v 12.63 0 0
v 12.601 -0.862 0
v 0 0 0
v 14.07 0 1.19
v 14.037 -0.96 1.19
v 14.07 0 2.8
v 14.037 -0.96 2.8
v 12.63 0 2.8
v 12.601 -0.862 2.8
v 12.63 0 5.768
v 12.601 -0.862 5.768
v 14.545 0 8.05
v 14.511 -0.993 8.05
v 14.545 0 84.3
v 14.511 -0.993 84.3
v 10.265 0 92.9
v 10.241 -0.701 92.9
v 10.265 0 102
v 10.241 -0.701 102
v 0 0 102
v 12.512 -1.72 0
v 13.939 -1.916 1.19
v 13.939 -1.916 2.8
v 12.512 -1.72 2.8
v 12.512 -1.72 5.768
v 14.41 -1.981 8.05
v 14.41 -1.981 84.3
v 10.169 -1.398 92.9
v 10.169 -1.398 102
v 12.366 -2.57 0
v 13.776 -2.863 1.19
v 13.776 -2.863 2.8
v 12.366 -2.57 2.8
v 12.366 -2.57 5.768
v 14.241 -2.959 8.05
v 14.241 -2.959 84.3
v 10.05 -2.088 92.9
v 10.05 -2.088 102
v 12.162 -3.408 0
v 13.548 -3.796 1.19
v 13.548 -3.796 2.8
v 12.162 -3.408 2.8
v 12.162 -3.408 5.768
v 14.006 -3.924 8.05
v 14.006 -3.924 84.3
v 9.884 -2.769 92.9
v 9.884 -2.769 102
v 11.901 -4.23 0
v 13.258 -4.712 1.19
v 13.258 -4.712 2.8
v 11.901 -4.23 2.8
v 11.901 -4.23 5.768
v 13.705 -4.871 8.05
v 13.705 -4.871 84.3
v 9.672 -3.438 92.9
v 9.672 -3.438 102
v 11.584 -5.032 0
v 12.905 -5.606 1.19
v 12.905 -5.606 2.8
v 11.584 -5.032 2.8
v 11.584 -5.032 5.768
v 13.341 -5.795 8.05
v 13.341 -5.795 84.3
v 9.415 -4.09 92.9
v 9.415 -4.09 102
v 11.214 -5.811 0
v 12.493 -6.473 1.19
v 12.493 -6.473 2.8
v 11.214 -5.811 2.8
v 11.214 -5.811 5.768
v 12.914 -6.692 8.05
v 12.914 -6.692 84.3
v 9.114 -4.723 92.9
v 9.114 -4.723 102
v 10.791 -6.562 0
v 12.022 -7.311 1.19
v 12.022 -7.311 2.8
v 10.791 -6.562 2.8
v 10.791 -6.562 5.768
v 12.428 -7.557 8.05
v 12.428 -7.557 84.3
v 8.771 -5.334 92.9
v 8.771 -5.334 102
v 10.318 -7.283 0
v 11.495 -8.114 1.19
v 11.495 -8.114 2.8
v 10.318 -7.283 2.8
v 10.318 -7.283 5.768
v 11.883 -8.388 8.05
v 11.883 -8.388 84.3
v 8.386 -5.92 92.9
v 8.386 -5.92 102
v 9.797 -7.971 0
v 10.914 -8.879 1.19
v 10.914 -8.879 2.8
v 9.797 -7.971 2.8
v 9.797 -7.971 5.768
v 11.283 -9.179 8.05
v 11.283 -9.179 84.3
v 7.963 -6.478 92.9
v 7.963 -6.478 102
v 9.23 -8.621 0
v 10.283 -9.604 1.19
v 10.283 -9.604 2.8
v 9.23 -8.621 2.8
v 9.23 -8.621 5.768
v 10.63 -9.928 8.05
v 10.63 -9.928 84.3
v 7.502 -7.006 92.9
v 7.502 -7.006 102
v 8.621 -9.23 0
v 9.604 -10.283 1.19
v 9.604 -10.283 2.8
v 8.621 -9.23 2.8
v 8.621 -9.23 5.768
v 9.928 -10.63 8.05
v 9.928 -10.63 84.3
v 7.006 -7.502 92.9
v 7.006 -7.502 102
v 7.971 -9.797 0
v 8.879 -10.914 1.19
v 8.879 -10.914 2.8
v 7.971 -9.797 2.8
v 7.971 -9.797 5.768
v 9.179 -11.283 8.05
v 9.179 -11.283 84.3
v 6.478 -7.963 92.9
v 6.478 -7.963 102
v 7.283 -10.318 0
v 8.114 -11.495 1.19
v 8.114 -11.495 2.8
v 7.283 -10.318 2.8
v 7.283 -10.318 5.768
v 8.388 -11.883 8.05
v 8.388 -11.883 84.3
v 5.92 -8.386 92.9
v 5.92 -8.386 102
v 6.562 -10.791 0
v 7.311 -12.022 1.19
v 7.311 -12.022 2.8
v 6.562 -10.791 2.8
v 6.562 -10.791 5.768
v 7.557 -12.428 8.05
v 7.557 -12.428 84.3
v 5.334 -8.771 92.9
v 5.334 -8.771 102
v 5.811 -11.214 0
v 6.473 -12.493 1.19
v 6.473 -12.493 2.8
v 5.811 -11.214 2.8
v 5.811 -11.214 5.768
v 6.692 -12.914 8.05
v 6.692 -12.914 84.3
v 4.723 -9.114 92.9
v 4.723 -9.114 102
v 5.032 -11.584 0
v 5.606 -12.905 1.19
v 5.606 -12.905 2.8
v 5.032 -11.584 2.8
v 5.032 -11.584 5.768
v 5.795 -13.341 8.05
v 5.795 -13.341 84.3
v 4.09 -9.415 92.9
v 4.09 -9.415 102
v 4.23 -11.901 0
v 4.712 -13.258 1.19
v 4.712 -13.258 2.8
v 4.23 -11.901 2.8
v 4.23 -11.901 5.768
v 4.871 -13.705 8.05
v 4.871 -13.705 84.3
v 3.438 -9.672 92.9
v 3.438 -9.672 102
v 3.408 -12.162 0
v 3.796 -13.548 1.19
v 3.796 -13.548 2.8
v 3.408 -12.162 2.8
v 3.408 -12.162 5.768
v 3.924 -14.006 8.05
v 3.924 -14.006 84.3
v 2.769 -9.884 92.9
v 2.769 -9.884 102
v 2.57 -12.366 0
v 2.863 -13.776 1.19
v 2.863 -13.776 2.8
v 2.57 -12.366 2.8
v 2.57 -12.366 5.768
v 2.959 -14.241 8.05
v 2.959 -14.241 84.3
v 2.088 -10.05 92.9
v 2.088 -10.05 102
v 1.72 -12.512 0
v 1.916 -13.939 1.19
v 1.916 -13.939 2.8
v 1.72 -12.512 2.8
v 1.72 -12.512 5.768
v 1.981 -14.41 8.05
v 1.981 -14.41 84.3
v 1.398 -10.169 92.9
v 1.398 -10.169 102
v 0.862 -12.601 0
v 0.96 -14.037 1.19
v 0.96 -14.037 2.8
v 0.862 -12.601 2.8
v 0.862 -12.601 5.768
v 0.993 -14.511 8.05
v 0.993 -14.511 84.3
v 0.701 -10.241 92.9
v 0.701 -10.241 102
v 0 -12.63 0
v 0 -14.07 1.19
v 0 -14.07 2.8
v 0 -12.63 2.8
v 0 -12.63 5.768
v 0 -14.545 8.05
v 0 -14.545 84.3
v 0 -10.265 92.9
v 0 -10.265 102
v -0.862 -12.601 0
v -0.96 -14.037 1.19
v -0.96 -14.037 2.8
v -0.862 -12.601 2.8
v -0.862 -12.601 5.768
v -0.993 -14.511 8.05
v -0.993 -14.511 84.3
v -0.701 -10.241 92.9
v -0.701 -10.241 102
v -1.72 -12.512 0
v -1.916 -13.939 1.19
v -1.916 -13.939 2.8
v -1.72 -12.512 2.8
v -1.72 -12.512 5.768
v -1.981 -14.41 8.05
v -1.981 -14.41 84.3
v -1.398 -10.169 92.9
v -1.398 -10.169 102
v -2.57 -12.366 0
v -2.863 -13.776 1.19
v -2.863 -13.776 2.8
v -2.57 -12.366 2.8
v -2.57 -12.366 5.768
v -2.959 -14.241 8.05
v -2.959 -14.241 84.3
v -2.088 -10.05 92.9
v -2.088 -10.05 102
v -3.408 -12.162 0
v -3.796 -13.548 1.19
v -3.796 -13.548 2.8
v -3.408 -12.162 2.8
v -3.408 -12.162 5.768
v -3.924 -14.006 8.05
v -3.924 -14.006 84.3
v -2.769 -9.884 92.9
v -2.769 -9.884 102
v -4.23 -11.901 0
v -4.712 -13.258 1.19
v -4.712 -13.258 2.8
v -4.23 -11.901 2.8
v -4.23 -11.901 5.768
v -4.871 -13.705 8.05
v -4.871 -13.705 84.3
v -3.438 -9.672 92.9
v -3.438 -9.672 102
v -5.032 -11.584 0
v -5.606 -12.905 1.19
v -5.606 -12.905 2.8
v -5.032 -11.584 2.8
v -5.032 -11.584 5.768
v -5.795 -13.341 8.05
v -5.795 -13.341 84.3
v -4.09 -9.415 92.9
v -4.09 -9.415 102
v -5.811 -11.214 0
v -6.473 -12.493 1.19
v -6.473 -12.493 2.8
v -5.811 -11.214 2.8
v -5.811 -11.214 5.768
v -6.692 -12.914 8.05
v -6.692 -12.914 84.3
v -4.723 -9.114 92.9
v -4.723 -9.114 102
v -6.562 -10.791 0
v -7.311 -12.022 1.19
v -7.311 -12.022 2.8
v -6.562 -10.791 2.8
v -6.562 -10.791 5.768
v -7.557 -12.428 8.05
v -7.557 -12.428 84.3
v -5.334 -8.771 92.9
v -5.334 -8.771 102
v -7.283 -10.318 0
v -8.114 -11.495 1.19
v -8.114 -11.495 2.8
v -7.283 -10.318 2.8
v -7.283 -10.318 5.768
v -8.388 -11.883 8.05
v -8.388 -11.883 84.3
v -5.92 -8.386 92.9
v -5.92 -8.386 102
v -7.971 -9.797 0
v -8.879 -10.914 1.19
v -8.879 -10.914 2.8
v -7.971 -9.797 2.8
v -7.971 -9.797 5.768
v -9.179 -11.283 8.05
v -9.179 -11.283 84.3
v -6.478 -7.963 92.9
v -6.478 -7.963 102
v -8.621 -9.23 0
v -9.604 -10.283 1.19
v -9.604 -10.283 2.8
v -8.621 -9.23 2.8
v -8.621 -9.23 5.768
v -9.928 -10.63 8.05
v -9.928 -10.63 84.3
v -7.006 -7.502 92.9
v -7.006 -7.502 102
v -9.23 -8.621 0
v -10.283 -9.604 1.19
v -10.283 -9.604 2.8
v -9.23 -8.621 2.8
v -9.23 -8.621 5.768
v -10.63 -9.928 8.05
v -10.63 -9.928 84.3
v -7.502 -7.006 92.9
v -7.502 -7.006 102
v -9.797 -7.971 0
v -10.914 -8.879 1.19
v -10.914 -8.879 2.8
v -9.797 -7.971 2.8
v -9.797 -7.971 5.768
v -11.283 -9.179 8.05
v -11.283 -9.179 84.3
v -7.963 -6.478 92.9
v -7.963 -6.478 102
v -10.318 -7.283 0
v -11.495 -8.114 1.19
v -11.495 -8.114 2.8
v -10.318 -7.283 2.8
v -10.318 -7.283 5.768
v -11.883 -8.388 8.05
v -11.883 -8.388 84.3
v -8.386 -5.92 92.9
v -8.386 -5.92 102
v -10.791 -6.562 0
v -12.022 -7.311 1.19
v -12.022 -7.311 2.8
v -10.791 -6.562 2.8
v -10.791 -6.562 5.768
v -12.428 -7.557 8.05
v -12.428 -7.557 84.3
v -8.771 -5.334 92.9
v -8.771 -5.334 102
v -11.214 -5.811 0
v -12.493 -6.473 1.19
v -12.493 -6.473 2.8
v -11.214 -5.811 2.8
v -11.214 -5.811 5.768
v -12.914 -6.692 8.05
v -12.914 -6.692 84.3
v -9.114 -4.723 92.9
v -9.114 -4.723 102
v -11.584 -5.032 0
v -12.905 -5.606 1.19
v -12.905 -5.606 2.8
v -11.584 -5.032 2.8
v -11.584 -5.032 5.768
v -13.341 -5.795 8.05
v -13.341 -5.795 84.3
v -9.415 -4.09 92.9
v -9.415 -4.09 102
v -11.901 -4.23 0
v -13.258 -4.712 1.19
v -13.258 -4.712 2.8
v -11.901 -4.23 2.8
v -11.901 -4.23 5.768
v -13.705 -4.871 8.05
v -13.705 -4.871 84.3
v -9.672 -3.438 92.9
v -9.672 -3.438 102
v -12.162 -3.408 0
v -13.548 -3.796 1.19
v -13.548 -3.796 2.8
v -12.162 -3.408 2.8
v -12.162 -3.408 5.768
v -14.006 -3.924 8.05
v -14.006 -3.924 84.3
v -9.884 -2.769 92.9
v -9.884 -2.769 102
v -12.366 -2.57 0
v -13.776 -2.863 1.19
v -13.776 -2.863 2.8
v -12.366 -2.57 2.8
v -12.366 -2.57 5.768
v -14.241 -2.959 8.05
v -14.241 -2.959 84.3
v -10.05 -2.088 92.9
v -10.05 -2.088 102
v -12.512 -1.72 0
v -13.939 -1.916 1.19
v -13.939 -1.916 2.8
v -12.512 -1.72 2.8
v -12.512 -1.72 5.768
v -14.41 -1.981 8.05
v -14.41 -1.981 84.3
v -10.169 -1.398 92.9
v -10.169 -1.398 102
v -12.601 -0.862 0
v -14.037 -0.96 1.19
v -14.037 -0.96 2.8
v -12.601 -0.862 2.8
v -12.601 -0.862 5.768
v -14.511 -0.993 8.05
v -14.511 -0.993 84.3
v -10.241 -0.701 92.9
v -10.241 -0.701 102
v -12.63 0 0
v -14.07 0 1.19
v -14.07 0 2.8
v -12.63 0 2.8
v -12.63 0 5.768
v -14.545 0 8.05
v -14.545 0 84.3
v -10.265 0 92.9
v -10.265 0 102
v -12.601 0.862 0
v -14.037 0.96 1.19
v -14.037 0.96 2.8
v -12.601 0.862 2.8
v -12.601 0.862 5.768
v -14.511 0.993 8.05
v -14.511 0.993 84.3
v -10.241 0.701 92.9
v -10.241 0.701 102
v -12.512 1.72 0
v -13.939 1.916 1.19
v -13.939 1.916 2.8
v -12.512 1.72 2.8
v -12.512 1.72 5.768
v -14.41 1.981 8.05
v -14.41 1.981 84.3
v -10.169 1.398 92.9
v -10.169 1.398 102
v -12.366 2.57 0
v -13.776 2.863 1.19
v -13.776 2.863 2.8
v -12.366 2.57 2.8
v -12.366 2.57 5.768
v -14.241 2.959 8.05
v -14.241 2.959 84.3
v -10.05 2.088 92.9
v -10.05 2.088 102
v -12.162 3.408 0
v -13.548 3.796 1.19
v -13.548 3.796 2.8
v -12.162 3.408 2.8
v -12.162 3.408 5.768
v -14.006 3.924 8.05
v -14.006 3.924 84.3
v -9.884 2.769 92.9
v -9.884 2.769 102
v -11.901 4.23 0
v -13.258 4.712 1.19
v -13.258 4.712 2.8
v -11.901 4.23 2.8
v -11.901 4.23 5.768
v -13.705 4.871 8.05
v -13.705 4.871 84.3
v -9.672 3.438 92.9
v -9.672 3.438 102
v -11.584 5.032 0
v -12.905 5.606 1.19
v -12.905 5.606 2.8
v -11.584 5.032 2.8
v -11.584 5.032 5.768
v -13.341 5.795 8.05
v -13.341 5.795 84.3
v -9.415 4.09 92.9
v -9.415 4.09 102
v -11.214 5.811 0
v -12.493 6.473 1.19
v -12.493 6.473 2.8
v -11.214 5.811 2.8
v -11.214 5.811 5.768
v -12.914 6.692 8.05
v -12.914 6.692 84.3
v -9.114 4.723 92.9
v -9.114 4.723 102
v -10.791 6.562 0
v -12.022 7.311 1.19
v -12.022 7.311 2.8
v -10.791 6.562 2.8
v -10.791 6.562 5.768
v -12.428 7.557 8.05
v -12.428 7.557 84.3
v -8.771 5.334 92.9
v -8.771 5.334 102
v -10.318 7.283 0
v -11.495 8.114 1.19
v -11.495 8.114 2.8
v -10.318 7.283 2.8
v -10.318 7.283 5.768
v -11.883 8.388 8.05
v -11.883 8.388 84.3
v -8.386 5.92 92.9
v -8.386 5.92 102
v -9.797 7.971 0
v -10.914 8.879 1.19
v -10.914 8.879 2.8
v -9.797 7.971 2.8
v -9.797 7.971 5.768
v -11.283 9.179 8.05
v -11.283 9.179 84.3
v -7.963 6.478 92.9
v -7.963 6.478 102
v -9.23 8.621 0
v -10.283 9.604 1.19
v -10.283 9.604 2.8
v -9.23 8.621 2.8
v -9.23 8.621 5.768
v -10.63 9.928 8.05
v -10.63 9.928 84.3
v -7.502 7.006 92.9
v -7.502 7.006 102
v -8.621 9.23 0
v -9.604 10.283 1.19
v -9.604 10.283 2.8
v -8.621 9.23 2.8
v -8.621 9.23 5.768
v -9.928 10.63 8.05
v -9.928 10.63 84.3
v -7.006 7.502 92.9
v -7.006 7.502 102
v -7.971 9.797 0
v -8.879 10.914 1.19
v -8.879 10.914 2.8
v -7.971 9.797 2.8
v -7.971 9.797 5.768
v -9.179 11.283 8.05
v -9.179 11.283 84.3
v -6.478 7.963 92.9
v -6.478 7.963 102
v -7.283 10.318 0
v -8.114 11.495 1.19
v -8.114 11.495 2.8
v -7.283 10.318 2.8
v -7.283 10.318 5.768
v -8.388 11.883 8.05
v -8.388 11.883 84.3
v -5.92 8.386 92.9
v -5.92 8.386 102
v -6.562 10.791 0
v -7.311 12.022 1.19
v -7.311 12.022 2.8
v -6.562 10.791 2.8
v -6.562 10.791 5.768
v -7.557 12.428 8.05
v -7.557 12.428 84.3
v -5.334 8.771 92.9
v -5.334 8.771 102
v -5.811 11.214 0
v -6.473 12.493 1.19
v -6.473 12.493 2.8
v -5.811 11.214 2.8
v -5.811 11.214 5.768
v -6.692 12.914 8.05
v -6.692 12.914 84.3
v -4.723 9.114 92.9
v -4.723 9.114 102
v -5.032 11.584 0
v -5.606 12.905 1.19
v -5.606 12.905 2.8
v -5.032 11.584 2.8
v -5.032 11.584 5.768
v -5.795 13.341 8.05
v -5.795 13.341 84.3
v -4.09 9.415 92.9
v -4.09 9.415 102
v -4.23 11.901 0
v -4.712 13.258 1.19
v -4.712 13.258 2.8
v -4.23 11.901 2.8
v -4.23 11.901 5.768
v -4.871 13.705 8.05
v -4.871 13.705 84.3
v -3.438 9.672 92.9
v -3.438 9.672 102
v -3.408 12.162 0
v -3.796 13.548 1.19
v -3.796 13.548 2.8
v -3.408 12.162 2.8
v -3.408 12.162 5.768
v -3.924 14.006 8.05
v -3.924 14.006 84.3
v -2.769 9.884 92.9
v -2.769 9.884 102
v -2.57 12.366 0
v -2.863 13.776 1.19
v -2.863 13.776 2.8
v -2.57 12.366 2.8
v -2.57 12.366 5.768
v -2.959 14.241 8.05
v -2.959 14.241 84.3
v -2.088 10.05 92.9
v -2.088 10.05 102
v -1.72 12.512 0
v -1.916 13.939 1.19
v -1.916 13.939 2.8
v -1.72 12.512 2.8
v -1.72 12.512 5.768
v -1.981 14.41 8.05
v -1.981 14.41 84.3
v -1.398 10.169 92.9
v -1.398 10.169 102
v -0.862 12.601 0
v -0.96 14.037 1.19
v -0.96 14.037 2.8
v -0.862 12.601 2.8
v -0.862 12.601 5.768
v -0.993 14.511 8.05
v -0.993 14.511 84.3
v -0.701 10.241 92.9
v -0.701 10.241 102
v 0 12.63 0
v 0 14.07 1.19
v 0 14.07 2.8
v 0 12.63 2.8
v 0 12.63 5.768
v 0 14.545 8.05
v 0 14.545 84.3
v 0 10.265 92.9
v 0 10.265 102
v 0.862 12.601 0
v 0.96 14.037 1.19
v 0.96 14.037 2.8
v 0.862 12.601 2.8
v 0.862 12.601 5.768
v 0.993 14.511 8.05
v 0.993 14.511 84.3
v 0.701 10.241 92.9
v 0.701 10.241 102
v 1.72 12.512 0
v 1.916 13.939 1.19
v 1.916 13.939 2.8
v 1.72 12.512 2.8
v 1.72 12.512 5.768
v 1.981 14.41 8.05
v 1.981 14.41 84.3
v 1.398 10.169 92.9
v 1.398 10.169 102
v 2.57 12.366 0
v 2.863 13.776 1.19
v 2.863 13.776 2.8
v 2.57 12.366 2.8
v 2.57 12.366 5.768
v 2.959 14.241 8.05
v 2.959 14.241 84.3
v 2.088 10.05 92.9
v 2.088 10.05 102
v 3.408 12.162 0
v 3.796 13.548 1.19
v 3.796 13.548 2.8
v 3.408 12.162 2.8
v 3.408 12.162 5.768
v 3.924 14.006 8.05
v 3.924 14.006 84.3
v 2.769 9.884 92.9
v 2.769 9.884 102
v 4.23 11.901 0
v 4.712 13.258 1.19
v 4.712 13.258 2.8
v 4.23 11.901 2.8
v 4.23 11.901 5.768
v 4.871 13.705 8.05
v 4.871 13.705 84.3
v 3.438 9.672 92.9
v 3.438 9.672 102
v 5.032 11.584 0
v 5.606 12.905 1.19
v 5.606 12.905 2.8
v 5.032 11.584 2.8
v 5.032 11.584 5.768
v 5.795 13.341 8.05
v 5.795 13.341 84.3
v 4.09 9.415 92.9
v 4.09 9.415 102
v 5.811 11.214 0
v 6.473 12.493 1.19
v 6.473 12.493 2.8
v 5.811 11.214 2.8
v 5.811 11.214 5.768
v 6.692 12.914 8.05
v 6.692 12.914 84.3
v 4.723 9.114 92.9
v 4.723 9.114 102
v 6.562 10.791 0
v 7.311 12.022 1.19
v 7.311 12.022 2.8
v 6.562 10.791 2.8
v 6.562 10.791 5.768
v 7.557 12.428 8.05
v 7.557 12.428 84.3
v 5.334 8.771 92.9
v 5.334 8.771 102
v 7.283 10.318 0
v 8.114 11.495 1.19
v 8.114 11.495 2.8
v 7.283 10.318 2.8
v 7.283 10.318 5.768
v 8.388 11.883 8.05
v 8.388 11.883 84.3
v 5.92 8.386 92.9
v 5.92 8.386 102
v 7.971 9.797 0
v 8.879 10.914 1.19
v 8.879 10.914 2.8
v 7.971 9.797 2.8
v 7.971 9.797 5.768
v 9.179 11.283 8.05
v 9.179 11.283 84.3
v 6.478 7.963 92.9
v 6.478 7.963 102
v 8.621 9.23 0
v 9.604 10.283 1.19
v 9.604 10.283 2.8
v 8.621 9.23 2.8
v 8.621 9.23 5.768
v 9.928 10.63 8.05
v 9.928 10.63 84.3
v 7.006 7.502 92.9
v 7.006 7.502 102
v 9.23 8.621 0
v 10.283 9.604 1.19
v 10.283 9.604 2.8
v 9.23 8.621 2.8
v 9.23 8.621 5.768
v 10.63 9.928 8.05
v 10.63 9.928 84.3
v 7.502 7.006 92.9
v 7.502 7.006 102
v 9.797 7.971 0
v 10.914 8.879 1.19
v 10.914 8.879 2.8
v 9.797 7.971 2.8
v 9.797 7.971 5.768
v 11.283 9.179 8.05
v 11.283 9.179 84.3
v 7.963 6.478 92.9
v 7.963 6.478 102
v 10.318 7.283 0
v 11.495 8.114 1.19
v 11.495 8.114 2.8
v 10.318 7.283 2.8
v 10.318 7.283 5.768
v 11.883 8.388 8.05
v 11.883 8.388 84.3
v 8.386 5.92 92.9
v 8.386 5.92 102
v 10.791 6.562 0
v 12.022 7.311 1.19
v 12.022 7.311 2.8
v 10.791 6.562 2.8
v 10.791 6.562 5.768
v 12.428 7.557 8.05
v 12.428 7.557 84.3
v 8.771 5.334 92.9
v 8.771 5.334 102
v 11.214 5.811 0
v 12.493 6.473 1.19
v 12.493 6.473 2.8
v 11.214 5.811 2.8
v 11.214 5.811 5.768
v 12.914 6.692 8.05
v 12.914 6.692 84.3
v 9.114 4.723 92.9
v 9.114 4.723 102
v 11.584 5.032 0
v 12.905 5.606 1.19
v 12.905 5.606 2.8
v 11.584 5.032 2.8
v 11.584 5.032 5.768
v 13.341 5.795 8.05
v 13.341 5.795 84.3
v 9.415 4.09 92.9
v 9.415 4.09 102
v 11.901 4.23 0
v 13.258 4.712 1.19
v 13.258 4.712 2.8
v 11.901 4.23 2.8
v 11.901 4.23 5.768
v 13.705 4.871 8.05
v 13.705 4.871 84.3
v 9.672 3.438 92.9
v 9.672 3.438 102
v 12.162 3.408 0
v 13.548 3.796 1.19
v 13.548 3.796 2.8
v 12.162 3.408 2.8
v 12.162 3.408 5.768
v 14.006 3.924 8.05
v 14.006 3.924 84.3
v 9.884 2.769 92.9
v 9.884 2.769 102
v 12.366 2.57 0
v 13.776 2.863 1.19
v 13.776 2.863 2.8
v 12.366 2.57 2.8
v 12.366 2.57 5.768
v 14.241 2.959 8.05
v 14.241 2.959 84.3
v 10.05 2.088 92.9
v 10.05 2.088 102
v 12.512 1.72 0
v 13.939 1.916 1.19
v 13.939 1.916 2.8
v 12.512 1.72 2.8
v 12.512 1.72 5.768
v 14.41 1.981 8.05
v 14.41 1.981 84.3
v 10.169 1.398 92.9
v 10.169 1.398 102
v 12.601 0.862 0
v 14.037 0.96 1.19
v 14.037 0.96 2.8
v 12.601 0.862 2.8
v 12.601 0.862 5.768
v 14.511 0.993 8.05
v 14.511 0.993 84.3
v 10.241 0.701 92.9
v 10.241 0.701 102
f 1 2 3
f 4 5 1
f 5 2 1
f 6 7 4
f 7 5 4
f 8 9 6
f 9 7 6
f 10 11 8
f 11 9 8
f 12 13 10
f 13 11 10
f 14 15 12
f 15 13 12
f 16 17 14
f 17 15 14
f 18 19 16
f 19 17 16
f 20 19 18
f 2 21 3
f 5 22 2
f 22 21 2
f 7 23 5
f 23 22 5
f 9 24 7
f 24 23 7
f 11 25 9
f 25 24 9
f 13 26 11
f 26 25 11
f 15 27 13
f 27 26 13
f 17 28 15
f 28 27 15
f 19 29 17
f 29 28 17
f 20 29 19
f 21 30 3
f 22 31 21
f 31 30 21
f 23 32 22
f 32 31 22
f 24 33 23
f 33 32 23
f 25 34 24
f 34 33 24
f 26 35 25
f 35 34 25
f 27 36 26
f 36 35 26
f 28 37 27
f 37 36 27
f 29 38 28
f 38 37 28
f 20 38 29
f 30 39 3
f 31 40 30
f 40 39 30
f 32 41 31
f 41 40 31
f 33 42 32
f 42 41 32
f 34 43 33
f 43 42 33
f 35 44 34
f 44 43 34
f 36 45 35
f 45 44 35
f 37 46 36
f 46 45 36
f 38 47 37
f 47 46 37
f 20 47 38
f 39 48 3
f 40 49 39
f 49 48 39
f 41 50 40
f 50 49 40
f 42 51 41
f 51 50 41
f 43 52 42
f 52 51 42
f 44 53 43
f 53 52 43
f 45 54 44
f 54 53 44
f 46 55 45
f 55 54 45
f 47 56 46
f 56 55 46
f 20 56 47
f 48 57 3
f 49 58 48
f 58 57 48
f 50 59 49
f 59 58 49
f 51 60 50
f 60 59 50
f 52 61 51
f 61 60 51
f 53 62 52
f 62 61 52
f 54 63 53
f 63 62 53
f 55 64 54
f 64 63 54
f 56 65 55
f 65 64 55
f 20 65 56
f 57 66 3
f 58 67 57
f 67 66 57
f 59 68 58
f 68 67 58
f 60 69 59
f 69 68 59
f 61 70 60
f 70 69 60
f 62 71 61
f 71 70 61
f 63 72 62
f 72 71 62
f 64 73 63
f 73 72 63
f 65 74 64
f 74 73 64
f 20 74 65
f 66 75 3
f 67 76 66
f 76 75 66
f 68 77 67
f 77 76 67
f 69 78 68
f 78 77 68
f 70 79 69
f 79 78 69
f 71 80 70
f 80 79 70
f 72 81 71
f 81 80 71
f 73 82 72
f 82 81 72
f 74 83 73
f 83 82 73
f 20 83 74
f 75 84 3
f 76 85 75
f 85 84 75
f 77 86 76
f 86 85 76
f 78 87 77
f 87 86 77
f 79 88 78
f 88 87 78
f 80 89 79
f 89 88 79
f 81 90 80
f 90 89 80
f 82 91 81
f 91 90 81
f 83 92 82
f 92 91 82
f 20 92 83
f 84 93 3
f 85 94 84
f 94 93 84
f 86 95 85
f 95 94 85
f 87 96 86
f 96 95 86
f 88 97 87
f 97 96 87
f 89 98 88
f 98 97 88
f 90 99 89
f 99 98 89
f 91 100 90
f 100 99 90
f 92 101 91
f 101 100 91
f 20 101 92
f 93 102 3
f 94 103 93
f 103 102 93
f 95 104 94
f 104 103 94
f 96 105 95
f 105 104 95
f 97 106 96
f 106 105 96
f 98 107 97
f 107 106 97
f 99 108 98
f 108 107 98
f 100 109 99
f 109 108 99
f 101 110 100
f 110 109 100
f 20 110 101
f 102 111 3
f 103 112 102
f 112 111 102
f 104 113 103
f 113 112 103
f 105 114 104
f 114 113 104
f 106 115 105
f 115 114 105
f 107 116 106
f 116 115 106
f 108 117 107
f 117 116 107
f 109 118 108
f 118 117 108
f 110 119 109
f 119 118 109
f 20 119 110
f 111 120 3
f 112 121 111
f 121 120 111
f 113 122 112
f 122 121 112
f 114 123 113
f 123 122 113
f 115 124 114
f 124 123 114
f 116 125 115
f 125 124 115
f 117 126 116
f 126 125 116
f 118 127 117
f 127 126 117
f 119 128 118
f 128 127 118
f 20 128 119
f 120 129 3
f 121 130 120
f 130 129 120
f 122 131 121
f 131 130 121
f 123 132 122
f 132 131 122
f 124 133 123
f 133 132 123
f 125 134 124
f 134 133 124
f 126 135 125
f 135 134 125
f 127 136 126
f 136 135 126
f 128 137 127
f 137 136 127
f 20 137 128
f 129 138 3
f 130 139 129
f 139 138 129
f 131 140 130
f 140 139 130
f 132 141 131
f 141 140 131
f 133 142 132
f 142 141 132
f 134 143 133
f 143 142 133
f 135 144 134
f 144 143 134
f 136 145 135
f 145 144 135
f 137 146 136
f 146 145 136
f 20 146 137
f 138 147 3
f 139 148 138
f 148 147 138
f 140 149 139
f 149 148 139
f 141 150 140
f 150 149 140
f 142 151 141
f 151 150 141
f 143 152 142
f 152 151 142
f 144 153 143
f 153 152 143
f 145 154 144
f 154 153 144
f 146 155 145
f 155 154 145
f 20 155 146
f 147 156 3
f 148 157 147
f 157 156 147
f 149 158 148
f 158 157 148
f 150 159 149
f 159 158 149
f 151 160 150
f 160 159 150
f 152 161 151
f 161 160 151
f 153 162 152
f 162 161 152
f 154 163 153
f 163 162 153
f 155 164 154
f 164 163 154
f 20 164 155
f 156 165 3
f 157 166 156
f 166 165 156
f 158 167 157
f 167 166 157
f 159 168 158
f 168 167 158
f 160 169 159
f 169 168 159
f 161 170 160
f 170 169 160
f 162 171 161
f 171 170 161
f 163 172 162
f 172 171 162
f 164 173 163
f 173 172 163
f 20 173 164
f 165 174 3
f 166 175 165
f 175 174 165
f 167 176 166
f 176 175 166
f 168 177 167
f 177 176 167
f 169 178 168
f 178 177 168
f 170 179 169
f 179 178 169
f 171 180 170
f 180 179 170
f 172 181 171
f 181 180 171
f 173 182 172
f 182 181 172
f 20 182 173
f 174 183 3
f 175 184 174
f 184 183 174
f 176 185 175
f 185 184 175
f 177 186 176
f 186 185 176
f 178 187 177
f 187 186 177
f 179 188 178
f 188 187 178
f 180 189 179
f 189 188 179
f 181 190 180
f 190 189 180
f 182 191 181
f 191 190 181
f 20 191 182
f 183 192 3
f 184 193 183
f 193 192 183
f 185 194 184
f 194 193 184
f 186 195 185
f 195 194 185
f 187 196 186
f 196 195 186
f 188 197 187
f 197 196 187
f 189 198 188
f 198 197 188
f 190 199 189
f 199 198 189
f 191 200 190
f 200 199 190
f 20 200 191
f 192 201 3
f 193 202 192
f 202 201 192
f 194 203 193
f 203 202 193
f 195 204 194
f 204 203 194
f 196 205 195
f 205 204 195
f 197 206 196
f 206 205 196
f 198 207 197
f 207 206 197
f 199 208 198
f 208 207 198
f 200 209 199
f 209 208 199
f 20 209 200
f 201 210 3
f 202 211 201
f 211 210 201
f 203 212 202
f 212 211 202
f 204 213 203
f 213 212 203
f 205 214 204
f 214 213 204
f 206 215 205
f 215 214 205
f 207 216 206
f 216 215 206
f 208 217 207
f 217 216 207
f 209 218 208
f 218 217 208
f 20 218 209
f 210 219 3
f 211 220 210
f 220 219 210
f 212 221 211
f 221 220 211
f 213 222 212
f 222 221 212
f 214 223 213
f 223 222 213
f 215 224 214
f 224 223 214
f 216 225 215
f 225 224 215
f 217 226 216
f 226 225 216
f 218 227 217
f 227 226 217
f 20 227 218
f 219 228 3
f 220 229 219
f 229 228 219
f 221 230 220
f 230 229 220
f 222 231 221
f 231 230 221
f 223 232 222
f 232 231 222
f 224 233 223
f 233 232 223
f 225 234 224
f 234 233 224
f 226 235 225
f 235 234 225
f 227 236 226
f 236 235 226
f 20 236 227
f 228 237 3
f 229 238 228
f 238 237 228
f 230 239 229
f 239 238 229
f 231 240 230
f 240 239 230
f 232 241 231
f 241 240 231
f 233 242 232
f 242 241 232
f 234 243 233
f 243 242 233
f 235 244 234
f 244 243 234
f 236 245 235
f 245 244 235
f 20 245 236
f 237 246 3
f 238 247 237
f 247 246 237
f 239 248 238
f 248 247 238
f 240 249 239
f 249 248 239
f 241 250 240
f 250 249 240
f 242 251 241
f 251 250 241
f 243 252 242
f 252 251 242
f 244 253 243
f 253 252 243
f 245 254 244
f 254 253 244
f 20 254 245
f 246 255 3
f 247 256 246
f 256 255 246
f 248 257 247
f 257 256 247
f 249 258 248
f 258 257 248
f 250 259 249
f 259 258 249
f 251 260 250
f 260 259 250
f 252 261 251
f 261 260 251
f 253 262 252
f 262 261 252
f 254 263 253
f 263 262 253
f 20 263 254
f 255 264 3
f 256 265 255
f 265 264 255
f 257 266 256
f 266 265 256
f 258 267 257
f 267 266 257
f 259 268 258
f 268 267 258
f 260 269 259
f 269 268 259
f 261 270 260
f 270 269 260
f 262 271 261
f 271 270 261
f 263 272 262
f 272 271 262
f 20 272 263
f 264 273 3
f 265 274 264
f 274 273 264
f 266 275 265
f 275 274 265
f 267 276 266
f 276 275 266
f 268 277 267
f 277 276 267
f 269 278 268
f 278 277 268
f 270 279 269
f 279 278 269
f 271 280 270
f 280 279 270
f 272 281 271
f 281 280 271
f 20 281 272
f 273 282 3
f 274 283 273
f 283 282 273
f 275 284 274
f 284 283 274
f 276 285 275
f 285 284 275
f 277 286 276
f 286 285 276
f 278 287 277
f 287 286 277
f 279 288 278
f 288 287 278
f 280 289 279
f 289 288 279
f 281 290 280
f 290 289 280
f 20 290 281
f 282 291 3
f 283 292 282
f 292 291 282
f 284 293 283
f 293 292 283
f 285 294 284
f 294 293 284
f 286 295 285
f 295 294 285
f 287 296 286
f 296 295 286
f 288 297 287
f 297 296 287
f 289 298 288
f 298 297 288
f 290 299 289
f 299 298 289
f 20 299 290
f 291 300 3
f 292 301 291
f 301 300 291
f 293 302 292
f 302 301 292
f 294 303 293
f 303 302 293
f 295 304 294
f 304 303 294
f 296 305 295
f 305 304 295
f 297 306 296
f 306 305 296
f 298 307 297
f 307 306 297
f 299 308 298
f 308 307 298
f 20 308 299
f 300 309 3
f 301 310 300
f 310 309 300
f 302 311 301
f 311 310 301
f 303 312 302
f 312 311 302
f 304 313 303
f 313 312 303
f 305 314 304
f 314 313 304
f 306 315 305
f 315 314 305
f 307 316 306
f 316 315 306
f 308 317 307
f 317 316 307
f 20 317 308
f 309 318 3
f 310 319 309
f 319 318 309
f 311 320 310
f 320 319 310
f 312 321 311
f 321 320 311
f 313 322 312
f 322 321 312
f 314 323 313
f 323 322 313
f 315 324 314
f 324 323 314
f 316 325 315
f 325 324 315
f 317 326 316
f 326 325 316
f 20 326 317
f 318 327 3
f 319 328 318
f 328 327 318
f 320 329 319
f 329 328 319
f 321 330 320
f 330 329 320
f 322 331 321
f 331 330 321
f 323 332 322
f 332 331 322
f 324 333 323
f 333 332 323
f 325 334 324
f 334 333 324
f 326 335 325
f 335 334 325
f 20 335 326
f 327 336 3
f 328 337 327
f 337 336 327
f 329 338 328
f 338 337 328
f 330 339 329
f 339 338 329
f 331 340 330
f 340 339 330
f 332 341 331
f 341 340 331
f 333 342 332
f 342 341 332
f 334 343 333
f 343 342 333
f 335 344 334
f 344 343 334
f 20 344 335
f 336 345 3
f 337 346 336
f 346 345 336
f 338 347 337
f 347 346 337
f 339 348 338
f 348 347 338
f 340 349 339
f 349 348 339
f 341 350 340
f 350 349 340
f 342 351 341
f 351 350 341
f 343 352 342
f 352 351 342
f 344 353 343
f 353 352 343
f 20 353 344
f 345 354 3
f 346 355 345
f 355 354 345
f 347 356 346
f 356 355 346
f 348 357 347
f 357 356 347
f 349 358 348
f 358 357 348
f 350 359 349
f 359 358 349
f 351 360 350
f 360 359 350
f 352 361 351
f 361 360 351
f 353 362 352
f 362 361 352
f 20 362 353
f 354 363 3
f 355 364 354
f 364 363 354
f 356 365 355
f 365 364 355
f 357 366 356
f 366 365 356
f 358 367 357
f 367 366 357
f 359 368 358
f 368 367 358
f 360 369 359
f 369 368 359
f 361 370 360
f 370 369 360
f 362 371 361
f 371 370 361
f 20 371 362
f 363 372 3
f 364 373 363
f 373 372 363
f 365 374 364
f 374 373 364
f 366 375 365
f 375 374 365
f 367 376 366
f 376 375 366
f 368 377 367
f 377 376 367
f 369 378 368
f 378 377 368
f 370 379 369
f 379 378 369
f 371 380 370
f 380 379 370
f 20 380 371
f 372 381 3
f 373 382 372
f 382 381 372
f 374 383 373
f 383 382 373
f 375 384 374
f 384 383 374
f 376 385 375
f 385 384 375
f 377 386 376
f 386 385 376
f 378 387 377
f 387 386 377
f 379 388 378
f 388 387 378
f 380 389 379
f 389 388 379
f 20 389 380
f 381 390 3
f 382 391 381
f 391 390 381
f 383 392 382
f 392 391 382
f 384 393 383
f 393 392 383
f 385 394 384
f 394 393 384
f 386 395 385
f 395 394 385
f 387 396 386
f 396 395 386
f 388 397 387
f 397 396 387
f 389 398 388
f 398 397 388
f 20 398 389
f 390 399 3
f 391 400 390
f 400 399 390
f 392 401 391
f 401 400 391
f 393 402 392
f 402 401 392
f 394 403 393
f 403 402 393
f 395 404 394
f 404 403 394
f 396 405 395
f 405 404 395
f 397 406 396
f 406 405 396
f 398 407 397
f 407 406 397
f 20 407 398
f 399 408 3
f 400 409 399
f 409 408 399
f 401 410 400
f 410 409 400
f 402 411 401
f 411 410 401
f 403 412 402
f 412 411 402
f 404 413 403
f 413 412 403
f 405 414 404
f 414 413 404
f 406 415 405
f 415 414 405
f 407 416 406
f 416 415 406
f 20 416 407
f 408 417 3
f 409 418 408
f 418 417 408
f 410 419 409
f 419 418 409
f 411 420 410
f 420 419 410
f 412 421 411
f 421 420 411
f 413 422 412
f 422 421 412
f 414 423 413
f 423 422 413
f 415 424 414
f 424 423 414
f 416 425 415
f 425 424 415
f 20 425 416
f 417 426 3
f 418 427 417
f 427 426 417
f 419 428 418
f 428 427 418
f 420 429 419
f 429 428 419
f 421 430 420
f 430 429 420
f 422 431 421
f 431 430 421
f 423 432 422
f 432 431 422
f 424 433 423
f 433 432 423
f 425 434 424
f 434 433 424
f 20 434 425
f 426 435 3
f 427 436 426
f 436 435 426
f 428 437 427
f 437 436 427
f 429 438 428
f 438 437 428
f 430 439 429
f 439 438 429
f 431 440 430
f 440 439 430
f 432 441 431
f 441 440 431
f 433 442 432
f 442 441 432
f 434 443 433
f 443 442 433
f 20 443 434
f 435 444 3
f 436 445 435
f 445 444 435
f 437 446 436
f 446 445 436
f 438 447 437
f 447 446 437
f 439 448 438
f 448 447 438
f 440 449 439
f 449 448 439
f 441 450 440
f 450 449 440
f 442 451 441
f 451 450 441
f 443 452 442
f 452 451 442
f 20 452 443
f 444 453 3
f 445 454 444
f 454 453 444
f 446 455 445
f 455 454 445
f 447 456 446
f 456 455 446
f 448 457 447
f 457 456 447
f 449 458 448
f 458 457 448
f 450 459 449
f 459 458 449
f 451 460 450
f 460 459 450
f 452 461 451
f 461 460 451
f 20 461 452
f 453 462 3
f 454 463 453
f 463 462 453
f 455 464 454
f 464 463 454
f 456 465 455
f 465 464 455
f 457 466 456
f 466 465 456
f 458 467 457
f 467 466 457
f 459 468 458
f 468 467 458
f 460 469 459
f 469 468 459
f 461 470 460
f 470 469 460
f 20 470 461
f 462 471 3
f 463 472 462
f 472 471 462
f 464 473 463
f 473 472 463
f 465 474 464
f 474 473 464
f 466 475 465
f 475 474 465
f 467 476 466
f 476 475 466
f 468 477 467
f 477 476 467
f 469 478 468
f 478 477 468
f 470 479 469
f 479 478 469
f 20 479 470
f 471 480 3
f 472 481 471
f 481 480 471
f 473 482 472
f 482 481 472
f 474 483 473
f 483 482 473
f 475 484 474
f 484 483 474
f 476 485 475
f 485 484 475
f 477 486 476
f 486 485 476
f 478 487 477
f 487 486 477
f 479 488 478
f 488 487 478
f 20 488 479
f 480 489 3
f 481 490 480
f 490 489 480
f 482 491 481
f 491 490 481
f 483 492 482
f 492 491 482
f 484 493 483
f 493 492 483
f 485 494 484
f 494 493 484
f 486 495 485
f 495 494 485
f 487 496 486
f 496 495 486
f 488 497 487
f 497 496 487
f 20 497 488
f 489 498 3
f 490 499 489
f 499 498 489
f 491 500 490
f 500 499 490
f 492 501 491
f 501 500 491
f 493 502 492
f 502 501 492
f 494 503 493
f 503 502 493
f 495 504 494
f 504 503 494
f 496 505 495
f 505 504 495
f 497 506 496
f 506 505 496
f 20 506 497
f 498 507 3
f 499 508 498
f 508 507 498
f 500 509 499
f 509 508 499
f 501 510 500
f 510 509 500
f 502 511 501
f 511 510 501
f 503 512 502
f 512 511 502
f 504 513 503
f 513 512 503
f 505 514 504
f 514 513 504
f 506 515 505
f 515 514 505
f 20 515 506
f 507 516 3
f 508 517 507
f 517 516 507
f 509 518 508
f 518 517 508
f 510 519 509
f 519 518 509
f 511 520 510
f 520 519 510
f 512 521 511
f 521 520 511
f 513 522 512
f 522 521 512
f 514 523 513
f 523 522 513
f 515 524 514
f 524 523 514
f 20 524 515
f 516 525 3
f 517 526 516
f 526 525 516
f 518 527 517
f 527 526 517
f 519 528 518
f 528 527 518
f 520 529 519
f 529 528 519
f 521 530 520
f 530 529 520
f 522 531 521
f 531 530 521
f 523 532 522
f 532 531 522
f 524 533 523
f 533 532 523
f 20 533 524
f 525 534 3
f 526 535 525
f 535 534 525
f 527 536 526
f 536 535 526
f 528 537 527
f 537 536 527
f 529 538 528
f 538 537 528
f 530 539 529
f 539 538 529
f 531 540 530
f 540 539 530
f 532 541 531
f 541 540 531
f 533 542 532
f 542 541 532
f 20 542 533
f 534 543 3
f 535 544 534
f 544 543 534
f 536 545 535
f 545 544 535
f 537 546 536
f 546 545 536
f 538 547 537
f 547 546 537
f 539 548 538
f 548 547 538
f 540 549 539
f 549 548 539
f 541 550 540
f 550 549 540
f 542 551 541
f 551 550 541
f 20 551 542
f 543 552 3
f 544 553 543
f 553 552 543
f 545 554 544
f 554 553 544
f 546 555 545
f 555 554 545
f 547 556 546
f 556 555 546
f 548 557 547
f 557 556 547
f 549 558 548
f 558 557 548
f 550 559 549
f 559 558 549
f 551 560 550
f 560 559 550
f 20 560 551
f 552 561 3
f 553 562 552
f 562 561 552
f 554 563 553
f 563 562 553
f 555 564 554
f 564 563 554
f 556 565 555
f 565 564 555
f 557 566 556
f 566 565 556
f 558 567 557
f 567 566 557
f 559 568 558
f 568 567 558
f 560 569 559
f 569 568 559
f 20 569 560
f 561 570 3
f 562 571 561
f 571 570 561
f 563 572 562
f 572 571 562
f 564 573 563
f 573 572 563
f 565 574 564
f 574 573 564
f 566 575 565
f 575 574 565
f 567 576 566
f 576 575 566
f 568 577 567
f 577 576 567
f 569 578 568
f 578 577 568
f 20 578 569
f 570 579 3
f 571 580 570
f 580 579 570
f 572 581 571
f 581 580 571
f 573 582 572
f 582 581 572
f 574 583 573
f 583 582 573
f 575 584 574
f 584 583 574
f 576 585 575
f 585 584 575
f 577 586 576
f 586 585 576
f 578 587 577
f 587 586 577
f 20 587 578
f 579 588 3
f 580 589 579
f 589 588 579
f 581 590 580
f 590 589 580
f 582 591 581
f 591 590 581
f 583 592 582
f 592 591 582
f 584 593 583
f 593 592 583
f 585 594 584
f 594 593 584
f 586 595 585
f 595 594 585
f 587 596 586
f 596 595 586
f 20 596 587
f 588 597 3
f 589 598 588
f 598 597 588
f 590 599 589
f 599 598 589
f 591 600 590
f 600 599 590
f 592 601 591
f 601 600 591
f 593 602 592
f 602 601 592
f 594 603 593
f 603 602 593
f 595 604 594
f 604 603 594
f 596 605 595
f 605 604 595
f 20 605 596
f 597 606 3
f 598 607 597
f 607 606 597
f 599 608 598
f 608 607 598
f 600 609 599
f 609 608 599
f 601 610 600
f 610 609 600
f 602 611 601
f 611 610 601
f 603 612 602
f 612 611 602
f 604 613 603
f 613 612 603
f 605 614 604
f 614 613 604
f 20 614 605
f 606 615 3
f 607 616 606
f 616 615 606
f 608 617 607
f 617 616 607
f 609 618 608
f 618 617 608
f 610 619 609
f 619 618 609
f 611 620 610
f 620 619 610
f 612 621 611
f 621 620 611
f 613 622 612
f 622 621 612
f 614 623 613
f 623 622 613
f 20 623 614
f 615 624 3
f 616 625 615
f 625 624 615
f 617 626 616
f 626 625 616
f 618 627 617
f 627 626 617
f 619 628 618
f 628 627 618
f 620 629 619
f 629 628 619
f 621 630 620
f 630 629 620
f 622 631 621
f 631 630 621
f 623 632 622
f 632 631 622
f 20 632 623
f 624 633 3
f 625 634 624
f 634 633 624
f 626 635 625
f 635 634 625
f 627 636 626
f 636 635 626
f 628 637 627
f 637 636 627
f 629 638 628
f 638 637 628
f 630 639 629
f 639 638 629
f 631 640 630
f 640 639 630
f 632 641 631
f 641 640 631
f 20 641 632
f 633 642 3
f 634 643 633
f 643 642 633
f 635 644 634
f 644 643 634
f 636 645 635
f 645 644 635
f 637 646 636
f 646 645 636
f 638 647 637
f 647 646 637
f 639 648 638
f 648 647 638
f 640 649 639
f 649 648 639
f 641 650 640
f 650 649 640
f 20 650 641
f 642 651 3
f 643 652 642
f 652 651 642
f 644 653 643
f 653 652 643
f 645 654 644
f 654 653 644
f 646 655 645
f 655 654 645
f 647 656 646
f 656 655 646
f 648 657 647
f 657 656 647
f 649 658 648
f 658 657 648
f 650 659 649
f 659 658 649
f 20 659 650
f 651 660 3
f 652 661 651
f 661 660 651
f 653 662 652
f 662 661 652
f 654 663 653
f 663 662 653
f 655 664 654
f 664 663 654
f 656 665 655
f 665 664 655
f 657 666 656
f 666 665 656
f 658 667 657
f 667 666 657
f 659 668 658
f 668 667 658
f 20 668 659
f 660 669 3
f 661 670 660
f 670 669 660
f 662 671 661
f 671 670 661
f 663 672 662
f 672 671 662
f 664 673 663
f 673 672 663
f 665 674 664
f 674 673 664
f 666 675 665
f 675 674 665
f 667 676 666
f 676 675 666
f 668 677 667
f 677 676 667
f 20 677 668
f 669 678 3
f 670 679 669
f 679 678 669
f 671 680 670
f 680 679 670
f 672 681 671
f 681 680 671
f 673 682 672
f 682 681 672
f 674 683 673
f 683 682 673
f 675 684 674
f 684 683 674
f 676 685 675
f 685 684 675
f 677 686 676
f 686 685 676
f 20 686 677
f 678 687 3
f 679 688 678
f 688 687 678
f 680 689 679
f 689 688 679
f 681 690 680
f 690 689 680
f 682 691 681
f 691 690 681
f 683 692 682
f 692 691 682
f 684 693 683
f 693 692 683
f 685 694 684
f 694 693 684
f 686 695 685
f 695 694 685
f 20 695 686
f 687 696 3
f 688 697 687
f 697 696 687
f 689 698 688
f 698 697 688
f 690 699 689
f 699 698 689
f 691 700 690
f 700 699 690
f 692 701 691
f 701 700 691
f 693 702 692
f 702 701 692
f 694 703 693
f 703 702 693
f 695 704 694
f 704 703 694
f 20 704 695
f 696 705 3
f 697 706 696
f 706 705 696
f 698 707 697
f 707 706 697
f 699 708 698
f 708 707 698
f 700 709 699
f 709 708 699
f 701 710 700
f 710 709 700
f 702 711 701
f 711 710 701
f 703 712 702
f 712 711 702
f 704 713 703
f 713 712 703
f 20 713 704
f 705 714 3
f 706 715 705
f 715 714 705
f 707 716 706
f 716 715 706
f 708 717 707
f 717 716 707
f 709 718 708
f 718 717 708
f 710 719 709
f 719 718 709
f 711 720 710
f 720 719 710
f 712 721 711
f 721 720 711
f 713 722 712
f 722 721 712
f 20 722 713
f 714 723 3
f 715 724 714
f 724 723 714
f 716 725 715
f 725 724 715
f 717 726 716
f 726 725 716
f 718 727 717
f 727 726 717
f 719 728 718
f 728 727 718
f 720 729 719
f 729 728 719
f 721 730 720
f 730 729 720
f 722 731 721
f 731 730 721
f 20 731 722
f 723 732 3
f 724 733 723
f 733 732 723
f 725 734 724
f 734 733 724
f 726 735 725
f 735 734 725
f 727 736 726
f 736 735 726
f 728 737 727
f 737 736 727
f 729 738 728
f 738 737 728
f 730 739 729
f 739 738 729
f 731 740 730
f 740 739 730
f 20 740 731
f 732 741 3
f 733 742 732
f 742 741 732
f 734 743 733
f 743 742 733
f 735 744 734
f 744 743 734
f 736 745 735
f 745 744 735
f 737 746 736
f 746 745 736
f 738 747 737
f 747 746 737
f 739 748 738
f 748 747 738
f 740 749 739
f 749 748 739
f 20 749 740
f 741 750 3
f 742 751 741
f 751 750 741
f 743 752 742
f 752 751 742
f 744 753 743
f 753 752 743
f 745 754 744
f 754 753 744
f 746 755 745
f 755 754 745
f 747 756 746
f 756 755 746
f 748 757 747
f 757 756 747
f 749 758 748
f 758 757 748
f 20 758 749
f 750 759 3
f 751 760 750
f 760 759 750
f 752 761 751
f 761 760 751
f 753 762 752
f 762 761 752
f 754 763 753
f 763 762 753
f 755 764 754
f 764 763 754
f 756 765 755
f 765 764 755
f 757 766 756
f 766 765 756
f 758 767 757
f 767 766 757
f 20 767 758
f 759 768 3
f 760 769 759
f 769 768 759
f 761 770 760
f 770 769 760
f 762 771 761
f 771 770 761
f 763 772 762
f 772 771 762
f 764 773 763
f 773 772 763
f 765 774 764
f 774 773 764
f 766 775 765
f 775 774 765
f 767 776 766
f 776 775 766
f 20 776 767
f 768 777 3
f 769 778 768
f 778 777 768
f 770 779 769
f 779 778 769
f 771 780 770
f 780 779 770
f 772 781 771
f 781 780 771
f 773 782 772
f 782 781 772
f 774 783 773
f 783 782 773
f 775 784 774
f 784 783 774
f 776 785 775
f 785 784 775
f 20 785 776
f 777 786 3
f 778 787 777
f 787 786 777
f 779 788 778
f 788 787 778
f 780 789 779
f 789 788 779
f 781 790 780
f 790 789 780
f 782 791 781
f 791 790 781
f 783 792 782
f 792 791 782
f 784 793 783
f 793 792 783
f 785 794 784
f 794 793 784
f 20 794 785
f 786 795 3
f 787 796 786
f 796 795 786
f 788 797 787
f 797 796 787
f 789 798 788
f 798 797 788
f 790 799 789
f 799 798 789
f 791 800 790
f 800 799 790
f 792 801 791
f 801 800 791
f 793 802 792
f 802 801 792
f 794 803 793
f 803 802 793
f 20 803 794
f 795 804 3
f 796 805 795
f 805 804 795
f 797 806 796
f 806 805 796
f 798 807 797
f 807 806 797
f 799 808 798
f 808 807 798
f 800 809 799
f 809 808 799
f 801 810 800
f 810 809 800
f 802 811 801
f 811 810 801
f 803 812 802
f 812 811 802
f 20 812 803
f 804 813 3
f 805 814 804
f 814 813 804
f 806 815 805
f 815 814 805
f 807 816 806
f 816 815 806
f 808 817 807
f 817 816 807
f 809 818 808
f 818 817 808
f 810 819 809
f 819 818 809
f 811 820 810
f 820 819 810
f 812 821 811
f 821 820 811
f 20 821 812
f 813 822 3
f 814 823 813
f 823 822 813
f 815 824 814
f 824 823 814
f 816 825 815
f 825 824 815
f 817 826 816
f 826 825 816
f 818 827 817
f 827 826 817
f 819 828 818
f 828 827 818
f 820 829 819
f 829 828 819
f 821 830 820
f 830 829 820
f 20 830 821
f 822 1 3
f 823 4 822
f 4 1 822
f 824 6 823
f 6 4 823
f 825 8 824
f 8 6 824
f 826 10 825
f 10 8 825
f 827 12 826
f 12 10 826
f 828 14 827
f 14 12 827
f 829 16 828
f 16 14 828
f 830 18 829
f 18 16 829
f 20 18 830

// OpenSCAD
/* 20x102mm Vulcan Casing
 * Dimensions are approximate. 
 *
 * Call externally using ``vulcan_20x102mm_3d(angle=360)``
 *
 * All dimensions are given in millimeters and degrees unless otherwise 
 * stated.
 *
 * See also for more details: 
 * http://www.keywild.com/Six_Mountains/Images/Ammunition%2020x102mm_Vulcan.png
 * 
 * As of 10-26-2020 a 3D print of this in PLA did not fit in the breech of an 
 * M61 rotary cannon off of an AC-130A. Might be due to printer calibration. 
 * But since dimensions are approximated, it is also likely due to poor 
 * dimensioning of the computer model.
 *
 * TODO: find a 20mm casing and cut it up in 5mm increments. Measure wall 
 *       thicknesses and create a model with hollow interior
 * TODO: find a way to model the projectile (TP "Ball" projectile)
 *
 * Created by Andrew Smelser
 * Created on 4/6/2020
 * Updated on 09-14-2021
 */
$fa = 1;	// min. angle of fragment, degrees
$fs = 1;	// min. size of fragment, mm

vulcan_20x102mm_3d(360);

/*================================*/
/*       Module Definitions       */
/*================================*/
module vulcan_20x102mm_3d(angle=360){
	/* vulcan_20x102mm_3d(angle)
	 *
	 * 3D rotated extrusion of the 20x102mm Vulcan casing
	 * Filled interior; wall thicknesses not calculated or rendered.
	 * All dimensions/measurements in mm
	 *
	 * Inputs
	 * angle: the rotation angle for the 3D object. Default is 360 degrees.
	 */ 
	assert(angle <= 360, "Max angle is 360deg");
	assert(angle > 0, "Minimum angle must be greater than 0");
	rotate_extrude(angle=angle){
		vulcan_20x102mm_2d();
	};
};

module vulcan_20x102mm_2d(){
	/* vulcan_20x102mm_2d()
	 * 
	 * 2-Dimensional approximation of case dimensions for 20x102mm 
	 * Vulcan casing.
	 * 
	 * See http://www.keywild.com/Six_Mountains/Images/Ammunition%2020x102mm_Vulcan.png
	 * for details
	 *
	 * All dimensions in mm unless otherwise specified. 
	 *
	 * 2D polygon rendered in the +y and -x plane.
	 * 
	 * Updated on 10-22-2020
	 *   - Removed comments specifying dimensions in mm and replaced with a 
	 *     comment in the docstring
	 *   - removed old/dead code that had been commented out. Hopefully it 
	 *     wasn't important
	 * 
	 * Created by Andrew Smelser
	 * Created on 4-6-2020
	 */
	y1 = 2.9678;	// mm, approx.; Derived geometrically
	y2 = 2.2822;	// mm, approx.; Derived geometrically

	thick_base = 1.19;
	r_base = 25.26/2;

	thick_rim = 1.61;
	r_rim = 28.14/2;

	thick_groove = y1;
	r_groove = 25.26/2;
	
	thick_chamfer = y2;
	r_chamfer_aft = 25.26/2;
	r_chamfer_fore = 29.09/2;

	len_case = 76.25;
	len_shoulder = 8.6;
	r_case_shoulder_aft = 29.09/2;
	r_case_shoulder_fore = 20.53/2;

	len_neck = 9.1;
	r_neck_aft = 20.53/2;
	r_neck_fore = 20.53/2;

	/* Numeric Dimensions
	 * a = [-12.63, 0];
	 * b = [-14.07, 1.19];
	 * c = [-14.07, 2.80];
	 * d = [-12.63, 2.80];
	 * e = [-12.63, 2.80+y1];
	 * f = [-14.545, 2.80+y1+y2];
	 * g = [-14.545, 84.30];
	 * h = [-10.265, 92.90];
	 * i = [-10.265, 102.00];
	 */
	
	a = [-r_base, 0];
	b = [-r_rim, thick_base];
	c = [-r_rim, thick_base+thick_rim];
	d = [-r_groove, thick_base + thick_rim];
	e = [-r_chamfer_aft, thick_base + thick_rim + thick_groove];
	f = [-r_chamfer_fore, thick_base + thick_rim + thick_groove + thick_chamfer];
	g = [-r_case_shoulder_aft, thick_base + thick_rim + thick_groove + thick_chamfer + len_case];
	h = [-r_case_shoulder_fore, thick_base + thick_rim + thick_groove + thick_chamfer + len_case + len_shoulder];
	i = [-r_neck_aft, thick_base + thick_rim + thick_groove + thick_chamfer + len_case + len_shoulder + len_neck];
	polygon(points=[[0, 0], a, b, c, d, e, f, g, h, i, [0, 102.00]]);
};
